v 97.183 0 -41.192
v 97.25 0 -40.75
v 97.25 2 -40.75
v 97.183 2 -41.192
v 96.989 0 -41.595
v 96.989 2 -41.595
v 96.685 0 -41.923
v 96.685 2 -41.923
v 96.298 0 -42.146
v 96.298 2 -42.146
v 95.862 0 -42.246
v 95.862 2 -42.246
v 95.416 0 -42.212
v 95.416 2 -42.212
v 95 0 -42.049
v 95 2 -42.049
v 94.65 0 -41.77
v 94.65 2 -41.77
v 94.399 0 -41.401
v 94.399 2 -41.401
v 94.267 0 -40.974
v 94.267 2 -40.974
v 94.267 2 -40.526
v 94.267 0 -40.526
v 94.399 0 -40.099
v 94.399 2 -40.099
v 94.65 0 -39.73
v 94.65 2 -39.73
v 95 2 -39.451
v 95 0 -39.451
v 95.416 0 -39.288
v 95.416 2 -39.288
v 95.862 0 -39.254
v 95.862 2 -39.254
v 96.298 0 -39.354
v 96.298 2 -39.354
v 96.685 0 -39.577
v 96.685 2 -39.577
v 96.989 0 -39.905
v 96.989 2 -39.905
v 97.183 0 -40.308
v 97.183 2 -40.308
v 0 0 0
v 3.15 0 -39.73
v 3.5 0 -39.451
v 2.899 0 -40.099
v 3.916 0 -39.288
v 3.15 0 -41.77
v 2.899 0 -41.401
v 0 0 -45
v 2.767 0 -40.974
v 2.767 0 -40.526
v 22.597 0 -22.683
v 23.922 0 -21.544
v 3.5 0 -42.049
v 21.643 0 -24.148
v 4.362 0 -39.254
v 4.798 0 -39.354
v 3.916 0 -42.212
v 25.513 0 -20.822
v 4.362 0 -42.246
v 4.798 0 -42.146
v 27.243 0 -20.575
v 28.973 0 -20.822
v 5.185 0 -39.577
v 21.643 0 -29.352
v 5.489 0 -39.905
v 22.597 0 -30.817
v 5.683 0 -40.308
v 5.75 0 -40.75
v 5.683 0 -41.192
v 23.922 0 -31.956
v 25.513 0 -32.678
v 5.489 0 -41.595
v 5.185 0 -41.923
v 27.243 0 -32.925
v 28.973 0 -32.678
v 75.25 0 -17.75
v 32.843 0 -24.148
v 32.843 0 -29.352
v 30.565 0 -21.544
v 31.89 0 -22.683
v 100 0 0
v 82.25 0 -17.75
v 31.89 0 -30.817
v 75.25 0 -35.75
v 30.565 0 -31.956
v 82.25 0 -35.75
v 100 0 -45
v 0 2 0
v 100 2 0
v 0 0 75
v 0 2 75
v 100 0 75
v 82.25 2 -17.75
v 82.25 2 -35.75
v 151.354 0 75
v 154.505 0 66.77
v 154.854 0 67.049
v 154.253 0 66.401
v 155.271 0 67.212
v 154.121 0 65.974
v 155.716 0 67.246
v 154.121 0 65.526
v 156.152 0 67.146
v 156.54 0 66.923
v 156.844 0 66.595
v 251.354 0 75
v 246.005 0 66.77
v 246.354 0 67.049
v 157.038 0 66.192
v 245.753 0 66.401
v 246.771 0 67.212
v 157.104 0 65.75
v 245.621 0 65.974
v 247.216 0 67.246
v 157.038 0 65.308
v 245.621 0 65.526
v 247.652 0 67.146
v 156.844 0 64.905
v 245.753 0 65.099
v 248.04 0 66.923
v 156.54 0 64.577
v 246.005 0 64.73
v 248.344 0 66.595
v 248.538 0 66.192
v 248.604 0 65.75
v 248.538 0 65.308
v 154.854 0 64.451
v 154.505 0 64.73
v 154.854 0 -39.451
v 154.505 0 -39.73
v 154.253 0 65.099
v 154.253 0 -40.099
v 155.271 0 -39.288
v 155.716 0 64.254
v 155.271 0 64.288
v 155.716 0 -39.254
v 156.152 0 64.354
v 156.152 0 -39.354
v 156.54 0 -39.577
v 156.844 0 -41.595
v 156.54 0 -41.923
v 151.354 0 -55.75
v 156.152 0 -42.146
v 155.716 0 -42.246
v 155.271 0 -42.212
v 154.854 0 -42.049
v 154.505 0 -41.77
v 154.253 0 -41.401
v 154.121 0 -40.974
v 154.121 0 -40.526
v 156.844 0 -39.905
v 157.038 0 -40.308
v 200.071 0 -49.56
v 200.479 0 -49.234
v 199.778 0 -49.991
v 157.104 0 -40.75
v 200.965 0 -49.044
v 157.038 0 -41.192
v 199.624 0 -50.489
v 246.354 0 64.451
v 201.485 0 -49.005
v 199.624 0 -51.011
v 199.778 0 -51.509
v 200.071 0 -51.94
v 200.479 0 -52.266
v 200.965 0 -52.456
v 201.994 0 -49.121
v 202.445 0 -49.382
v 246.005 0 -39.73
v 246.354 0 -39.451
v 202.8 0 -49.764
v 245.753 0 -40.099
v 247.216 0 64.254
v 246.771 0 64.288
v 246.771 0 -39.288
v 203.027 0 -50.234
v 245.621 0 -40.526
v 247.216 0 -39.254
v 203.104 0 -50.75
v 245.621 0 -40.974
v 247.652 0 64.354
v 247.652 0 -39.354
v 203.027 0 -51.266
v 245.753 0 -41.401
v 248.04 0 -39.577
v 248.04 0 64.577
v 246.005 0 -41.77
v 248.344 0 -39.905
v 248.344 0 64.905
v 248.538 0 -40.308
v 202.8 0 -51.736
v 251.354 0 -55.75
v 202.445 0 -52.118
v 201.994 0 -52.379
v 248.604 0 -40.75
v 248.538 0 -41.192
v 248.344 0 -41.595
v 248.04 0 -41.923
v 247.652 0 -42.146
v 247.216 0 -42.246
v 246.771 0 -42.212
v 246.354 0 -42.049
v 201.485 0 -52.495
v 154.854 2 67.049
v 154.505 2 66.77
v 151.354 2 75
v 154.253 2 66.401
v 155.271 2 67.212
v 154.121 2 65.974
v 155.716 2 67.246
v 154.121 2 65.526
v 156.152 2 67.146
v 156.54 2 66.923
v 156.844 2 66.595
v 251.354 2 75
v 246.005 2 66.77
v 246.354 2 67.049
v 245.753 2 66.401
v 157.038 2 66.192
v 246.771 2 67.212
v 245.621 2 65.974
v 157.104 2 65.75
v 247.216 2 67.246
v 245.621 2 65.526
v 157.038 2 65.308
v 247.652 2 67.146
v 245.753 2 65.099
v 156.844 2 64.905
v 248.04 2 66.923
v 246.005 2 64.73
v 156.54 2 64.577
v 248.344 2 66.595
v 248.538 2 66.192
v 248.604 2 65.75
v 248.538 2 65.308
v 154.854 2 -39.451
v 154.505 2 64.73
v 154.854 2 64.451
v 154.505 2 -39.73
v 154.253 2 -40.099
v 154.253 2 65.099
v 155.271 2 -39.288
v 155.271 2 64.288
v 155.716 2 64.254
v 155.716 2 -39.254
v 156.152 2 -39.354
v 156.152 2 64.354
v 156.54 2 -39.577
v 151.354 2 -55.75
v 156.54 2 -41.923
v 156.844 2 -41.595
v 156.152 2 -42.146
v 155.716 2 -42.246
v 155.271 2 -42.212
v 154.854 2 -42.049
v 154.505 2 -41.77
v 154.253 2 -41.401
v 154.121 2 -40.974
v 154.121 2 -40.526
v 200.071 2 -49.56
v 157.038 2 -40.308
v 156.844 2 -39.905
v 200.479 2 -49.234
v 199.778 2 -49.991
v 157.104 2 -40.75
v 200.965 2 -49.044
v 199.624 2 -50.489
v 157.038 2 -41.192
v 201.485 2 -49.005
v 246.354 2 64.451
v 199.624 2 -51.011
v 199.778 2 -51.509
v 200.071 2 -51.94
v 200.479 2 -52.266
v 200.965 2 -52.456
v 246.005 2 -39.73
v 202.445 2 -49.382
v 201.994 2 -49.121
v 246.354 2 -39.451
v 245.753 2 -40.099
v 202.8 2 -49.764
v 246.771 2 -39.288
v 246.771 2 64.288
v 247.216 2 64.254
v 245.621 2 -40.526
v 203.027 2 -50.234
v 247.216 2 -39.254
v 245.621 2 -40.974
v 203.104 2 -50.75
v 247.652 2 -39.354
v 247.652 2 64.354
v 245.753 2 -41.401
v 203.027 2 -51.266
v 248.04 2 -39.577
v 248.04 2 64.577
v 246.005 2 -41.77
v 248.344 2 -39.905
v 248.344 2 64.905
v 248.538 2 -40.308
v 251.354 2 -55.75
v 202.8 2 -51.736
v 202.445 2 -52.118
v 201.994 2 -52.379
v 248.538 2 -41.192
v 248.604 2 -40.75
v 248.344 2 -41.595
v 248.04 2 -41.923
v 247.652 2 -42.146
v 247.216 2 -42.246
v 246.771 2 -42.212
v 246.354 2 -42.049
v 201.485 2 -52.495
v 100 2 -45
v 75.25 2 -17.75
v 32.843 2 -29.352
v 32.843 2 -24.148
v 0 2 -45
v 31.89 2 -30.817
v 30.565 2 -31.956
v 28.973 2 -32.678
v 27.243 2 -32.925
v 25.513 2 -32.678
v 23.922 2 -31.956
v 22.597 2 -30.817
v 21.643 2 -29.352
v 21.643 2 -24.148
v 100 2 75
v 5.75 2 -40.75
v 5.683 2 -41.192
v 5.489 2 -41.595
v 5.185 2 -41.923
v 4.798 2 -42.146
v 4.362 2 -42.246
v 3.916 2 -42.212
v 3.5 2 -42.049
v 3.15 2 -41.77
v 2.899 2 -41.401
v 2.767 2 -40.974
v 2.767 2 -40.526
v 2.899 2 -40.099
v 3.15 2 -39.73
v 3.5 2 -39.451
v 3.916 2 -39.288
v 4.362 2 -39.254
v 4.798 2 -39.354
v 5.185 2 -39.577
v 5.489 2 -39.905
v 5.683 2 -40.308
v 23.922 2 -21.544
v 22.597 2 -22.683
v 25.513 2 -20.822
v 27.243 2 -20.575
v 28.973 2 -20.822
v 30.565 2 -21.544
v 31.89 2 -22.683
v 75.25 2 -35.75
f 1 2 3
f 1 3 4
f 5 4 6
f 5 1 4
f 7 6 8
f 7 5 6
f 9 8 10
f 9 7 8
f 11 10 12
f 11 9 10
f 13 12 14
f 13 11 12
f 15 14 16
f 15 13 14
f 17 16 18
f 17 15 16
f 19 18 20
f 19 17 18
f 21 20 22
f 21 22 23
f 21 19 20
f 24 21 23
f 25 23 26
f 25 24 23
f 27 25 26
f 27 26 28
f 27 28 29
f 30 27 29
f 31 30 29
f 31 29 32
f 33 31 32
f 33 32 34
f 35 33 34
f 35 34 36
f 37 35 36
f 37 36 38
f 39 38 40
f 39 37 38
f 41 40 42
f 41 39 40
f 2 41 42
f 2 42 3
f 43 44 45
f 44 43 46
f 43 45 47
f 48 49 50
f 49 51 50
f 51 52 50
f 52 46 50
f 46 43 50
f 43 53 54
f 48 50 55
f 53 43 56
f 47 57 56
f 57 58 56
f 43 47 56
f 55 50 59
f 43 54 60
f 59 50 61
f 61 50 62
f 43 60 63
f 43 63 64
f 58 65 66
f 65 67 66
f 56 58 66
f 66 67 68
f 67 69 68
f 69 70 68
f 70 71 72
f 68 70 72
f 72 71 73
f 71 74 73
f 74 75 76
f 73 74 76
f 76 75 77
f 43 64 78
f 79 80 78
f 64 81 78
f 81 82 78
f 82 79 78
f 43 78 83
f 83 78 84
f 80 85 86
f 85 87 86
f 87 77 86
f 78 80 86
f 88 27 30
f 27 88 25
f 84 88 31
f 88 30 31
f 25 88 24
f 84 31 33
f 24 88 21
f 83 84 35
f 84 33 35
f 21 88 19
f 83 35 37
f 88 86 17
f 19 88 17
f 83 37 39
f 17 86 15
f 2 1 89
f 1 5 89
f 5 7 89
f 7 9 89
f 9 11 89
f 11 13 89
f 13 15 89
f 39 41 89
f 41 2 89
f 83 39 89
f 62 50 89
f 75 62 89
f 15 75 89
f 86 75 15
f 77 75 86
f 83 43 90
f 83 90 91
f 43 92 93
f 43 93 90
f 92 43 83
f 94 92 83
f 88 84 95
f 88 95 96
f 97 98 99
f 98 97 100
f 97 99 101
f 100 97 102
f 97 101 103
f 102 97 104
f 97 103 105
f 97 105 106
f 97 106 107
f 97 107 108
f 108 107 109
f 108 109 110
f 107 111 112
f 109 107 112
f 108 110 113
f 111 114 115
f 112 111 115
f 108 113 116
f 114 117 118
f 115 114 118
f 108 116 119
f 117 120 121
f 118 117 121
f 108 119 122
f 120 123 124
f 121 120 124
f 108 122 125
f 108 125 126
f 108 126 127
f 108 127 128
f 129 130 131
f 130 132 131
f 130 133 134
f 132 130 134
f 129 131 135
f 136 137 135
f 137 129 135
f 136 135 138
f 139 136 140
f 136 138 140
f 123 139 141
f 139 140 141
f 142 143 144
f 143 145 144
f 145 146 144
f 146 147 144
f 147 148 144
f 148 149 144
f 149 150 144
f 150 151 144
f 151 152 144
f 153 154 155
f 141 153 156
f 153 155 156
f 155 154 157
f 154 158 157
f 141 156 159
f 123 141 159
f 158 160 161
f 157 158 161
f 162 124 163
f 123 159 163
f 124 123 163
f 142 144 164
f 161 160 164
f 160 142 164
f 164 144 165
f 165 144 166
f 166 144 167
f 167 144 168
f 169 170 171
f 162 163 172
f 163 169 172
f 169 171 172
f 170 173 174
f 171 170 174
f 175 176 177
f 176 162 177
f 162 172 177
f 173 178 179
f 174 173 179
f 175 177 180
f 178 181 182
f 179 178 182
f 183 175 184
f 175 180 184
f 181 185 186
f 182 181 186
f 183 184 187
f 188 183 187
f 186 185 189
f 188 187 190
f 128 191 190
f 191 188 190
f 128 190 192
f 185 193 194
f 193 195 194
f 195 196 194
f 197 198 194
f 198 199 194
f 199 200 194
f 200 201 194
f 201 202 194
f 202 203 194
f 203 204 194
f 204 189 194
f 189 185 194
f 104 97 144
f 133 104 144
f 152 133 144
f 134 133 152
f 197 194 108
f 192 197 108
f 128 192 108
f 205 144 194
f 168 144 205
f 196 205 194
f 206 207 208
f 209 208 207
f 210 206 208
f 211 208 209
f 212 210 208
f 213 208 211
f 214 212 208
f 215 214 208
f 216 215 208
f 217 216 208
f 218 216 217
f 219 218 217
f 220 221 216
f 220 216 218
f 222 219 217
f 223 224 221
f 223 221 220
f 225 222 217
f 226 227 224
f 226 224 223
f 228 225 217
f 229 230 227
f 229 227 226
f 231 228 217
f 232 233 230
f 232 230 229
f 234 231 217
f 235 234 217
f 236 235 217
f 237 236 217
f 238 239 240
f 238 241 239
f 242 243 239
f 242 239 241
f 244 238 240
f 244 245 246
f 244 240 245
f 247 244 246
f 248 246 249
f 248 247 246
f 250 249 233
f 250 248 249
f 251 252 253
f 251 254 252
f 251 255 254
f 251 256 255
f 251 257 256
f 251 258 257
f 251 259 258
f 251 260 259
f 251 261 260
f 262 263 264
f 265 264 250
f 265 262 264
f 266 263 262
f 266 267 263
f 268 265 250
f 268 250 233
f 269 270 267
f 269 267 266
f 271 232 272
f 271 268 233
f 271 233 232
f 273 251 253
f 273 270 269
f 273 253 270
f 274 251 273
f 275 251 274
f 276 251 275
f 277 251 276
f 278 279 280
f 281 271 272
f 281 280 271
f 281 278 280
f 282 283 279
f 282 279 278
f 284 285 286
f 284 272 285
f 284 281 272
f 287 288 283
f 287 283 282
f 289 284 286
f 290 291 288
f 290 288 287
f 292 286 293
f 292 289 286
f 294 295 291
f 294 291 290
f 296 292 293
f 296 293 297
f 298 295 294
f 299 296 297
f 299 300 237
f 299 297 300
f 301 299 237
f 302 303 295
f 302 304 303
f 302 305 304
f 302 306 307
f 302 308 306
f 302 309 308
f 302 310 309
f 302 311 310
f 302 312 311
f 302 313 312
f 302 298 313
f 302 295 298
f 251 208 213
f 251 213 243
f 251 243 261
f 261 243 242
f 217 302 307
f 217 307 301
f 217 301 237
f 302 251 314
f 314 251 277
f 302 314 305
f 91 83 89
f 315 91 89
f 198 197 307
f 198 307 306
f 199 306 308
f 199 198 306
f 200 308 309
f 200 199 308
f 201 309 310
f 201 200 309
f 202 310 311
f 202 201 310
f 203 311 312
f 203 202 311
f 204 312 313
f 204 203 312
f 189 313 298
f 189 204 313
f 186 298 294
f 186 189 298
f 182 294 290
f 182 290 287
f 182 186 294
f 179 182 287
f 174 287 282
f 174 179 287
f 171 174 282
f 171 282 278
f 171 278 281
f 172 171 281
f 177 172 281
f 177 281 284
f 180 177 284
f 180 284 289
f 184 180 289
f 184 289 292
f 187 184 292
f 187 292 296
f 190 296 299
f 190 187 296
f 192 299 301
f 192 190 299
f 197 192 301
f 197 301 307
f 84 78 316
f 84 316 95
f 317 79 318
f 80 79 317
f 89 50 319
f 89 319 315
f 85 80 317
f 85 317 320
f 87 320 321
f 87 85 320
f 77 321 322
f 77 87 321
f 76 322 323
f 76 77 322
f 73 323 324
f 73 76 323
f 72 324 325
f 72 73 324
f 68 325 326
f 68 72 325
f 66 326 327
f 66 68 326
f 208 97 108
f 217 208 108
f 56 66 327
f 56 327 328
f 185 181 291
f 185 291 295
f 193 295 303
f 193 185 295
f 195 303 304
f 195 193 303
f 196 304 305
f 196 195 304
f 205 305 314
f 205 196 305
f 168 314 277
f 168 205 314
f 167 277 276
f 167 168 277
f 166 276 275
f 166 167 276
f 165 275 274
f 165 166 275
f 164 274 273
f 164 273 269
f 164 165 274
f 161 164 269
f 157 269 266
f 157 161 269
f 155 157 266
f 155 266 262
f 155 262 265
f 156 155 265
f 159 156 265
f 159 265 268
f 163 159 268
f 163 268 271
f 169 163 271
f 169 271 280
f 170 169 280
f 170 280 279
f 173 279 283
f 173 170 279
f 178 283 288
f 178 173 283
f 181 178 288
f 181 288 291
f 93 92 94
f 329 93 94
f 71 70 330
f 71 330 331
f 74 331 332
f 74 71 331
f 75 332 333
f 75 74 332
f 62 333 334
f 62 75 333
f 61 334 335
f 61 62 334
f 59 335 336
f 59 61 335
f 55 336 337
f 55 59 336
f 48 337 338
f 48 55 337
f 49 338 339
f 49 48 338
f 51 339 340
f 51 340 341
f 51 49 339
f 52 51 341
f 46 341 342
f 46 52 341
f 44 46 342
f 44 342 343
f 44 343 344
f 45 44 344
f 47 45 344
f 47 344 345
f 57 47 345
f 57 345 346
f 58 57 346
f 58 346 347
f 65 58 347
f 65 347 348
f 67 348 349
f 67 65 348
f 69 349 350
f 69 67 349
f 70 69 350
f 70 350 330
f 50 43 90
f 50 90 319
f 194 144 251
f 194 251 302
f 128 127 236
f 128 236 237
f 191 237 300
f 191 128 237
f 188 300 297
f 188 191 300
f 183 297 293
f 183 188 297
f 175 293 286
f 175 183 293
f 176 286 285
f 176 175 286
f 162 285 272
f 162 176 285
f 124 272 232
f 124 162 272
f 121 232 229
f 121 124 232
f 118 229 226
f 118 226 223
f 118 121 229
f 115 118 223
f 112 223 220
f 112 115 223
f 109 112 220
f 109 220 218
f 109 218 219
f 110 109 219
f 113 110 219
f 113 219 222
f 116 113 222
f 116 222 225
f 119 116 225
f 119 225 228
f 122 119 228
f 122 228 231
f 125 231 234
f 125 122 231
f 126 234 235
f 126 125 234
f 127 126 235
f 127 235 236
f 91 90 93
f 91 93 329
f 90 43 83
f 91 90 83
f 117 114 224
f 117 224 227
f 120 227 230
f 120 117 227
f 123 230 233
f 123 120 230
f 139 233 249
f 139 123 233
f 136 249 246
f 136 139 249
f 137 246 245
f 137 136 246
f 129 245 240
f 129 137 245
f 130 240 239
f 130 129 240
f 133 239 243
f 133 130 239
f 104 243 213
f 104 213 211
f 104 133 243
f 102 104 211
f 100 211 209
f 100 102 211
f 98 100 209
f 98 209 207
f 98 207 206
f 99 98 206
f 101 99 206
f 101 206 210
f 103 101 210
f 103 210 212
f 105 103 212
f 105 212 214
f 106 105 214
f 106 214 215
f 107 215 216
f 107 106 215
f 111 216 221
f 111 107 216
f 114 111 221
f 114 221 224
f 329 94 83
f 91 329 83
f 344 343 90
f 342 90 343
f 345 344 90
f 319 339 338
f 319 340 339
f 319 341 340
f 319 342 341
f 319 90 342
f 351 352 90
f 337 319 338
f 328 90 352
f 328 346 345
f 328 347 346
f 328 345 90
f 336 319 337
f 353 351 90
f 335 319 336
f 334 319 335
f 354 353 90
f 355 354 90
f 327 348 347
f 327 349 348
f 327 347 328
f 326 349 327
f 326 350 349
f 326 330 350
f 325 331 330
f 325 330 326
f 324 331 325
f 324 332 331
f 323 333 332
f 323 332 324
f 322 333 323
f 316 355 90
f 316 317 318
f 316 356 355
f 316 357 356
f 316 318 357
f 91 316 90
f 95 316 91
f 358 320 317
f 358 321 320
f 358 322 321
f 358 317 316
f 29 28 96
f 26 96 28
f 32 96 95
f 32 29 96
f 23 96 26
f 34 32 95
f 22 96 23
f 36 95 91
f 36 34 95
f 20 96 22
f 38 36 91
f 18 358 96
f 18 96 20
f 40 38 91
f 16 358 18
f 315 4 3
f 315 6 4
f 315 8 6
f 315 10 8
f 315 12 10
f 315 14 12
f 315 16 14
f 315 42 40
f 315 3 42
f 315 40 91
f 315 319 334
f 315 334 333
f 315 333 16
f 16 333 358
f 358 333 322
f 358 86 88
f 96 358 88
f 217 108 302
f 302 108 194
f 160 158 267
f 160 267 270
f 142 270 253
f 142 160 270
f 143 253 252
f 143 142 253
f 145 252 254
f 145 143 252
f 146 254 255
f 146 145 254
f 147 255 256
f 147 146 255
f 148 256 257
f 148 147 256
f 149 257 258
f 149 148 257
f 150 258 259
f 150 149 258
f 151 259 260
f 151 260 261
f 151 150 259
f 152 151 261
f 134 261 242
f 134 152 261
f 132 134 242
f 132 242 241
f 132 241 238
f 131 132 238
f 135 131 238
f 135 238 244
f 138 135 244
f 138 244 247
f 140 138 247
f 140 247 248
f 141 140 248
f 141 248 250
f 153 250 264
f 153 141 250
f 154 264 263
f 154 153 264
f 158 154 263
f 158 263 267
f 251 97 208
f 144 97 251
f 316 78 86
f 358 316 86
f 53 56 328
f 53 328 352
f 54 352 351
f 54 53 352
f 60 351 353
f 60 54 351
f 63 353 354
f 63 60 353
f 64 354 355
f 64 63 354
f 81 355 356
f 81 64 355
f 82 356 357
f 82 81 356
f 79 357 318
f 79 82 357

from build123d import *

# Parameters (mm, degrees)
SKETCH1_W             = 100
SKETCH1_H             = 45
SKETCH1_R             = 1.5
SKETCH1_W_2           = 7
SKETCH1_H_2           = 18
BOSS_EXTRUDE1_DEPTH   = 2
SKETCH1_H_3           = 130.75
SKETCH1_R_2           = 1.75
BOSS_EXTRUDE1_2_DEPTH = 2
SKETCH1_3_W           = 100
SKETCH1_3_H           = 75
BOSS_EXTRUDE2_DEPTH   = 2


with BuildPart() as part:
    # Sketch1 → Boss-Extrude1 (new body)
    with BuildSketch(Plane(origin=(0, 0, 0), x_dir=(1, 0, 0), z_dir=(0, 1, 0))):
        with Locations((50, 22.5)):
            Rectangle(SKETCH1_W, SKETCH1_H)
        with BuildLine():
            Line((21.643437278, 24.147957533), (21.643437278, 29.352042467))
            ThreePointArc((21.643437278, 29.352042467), (27.243437278, 32.925), (32.843437278, 29.352042467))
            Line((32.843437278, 29.352042467), (32.843437278, 24.147957533))
            ThreePointArc((32.843437278, 24.147957533), (27.243437278, 20.575), (21.643437278, 24.147957533))
        make_face(mode=Mode.SUBTRACT)
        with Locations((4.25, 40.75)):
            Circle(SKETCH1_R, mode=Mode.SUBTRACT)
        with Locations((78.75, 26.75)):
            Rectangle(SKETCH1_W_2, SKETCH1_H_2, mode=Mode.SUBTRACT)
        with Locations((95.75, 40.75)):
            Circle(SKETCH1_R, mode=Mode.SUBTRACT)
    extrude(amount=BOSS_EXTRUDE1_DEPTH)


with BuildPart() as body_2:
    # Sketch1 → Boss-Extrude1 2 (new body)
    with BuildSketch(Plane(origin=(0, 0, 0), x_dir=(1, 0, 0), z_dir=(0, 1, 0))):
        with Locations((201.354291092, -9.625)):
            Rectangle(SKETCH1_W, SKETCH1_H_3)
        with Locations((155.604291092, -65.75)):
            Circle(SKETCH1_R, mode=Mode.SUBTRACT)
        with Locations((247.104291092, -65.75)):
            Circle(SKETCH1_R, mode=Mode.SUBTRACT)
        with Locations((155.604291092, 40.75)):
            Circle(SKETCH1_R, mode=Mode.SUBTRACT)
        with Locations((201.354291092, 50.75)):
            Circle(SKETCH1_R_2, mode=Mode.SUBTRACT)
        with Locations((247.104291092, 40.75)):
            Circle(SKETCH1_R, mode=Mode.SUBTRACT)
    extrude(amount=BOSS_EXTRUDE1_2_DEPTH)


with BuildPart() as body_3:
    # Sketch1<3> → Boss-Extrude2 (new body)
    with BuildSketch(Plane(origin=(0, 0, 0), x_dir=(1, 0, 0), z_dir=(0, 1, 0))):
        with Locations((50, -37.5)):
            Rectangle(SKETCH1_3_W, SKETCH1_3_H)
    extrude(amount=BOSS_EXTRUDE2_DEPTH)


solid = Compound([part.part, body_2.part, body_3.part])
